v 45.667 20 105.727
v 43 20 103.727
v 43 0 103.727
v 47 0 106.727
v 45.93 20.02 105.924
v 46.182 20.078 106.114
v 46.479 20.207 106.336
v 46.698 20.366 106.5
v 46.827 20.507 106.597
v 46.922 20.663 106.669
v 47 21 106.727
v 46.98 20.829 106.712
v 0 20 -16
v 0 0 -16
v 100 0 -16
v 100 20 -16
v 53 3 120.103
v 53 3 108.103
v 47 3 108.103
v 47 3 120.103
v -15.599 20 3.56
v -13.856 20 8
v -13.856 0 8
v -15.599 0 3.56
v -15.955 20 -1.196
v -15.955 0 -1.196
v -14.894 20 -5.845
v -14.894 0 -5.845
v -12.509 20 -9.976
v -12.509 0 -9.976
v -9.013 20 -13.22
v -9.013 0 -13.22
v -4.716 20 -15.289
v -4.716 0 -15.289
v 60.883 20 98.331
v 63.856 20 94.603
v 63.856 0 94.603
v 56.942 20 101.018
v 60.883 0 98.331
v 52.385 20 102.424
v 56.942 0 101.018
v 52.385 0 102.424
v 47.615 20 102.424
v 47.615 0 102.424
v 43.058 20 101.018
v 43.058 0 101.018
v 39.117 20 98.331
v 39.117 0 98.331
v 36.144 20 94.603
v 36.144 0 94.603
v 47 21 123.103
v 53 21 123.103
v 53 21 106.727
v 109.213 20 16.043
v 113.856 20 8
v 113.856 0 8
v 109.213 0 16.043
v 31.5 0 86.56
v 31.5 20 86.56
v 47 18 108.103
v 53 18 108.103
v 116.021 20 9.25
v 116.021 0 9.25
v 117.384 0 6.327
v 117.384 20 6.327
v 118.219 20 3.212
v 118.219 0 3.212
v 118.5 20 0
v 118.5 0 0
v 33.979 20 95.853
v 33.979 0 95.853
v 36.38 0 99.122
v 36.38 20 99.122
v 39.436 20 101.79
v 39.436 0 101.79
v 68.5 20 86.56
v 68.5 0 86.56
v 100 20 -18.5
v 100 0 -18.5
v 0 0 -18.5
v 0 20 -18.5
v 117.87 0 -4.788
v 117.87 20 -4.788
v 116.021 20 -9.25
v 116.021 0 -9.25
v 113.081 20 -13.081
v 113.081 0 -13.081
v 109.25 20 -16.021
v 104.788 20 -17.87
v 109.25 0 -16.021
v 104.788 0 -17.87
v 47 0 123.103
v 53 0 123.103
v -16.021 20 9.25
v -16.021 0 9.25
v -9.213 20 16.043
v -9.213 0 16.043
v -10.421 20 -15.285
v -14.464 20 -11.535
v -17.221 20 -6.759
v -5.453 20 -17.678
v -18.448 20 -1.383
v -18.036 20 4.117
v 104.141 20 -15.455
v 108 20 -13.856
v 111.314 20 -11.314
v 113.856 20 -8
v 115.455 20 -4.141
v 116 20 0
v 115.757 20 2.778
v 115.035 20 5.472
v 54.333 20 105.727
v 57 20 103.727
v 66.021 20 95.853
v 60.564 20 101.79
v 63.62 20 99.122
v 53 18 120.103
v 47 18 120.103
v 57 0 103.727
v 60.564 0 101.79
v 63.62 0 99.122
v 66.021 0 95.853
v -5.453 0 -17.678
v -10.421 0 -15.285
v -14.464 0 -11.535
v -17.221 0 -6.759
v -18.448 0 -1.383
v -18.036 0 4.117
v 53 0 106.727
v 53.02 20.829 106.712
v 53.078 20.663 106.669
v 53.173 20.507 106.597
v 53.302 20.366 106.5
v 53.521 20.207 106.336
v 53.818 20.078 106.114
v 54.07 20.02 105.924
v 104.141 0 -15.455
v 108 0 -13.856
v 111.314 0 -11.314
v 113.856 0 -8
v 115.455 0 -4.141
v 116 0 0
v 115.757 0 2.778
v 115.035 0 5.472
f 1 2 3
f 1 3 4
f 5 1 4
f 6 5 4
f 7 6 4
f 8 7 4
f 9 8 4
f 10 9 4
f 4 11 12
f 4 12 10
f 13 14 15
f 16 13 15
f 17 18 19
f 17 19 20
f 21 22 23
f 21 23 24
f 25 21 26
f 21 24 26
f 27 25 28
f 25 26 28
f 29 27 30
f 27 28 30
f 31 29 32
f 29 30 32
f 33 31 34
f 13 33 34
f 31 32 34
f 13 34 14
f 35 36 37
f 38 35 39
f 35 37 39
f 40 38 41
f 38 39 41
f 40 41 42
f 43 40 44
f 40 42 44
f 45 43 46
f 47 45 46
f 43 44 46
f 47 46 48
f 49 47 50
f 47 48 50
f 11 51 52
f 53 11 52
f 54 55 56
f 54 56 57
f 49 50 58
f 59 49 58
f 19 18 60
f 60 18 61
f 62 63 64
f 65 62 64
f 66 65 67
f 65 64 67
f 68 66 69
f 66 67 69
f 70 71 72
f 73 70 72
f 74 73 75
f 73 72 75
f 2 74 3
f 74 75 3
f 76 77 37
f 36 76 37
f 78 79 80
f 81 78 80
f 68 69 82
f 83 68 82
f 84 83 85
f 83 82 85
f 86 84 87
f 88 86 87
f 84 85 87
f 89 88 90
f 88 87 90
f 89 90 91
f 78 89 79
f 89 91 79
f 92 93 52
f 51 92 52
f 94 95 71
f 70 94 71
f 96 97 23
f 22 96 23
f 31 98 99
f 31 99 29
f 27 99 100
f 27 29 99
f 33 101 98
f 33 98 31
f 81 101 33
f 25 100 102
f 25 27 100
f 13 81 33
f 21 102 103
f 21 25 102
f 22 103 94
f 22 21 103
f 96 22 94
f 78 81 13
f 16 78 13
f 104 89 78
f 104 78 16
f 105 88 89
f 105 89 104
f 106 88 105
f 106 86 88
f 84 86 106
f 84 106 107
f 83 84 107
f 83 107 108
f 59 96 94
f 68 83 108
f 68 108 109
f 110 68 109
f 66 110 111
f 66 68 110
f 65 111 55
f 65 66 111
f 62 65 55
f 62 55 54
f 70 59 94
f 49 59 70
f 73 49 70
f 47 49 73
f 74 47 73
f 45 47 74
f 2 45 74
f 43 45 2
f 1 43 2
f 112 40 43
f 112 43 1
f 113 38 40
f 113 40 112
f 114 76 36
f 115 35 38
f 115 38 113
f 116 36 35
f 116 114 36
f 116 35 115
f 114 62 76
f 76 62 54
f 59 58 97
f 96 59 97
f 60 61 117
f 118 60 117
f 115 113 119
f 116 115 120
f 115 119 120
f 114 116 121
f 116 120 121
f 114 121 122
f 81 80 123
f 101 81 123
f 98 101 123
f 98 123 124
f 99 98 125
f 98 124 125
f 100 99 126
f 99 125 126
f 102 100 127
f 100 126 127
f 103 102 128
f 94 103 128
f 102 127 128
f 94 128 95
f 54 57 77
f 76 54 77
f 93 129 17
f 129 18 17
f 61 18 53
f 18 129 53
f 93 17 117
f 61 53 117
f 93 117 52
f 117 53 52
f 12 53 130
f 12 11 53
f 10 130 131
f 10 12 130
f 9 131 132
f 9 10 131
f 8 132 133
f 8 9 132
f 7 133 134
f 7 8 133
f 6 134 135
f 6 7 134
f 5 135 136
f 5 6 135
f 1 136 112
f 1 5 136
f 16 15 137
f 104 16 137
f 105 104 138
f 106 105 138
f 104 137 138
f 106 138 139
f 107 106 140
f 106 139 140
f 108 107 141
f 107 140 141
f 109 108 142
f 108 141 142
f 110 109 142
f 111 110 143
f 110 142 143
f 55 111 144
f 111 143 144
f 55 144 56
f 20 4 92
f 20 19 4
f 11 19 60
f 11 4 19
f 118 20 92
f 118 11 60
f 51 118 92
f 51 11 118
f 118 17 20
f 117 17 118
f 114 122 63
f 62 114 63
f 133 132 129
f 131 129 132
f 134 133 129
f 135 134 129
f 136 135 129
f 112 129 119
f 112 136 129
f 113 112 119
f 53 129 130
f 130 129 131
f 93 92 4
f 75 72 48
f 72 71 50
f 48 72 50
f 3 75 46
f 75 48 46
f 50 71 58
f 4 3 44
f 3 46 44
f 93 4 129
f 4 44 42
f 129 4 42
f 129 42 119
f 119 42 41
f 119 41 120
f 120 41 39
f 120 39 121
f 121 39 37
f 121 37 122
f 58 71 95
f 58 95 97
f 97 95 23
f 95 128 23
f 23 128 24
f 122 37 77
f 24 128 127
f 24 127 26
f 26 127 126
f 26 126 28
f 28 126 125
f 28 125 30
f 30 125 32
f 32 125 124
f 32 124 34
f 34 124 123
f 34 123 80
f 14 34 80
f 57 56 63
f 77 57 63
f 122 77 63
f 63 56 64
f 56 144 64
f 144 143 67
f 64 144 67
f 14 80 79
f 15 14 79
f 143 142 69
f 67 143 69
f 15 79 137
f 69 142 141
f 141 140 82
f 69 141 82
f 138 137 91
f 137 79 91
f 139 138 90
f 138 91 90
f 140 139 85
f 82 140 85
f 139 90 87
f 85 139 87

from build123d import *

# Parameters (mm, degrees)
BOSS_EXTRUDE1_DEPTH      = 20
BOSS_EXTRUDE2_DEPTH      = 3
BOSS_EXTRUDE2_DEPTH_BACK = 3
SKETCH2_W                = 18
SKETCH2_H                = 21
SKETCH2_W_2              = 12
SKETCH2_H_2              = 15
BOSS_EXTRUDE3_DEPTH      = 21
CUT_EXTRUDE1_DEPTH       = 30
CUT_EXTRUDE1_DEPTH_BACK  = 30
SKETCH4_W                = 3
SKETCH4_H                = 1
FILLET1_R                = 1


with BuildPart() as part:
    # Sketch1 → Boss-Extrude1 (new body)
    with BuildSketch(Plane(origin=(0, 0, 0), x_dir=(1, 0, 0), z_dir=(0, 1, 0))):
        with BuildLine():
            Line((31.500049634, -86.559686407), (-9.212862555, -16.042853971))
            ThreePointArc((-9.212862555, -16.042853971), (-13.066315501, -13.096617855), (-16.02146997, -9.25))
            Line((-16.02146997, -9.25), (33.97853003, -95.852540378))
            ThreePointArc((33.97853003, -95.852540378), (32.124838484, -91.369992609), (31.500049634, -86.559686407))
        make_face()
        with BuildLine():
            Line((36.143593539, -94.602540378), (31.500049634, -86.559686407))
            ThreePointArc((31.500049634, -86.559686407), (32.124838484, -91.369992609), (33.97853003, -95.852540378))
            ThreePointArc((33.97853003, -95.852540378), (50, -105.102540378), (66.02146997, -95.852540378))
            ThreePointArc((66.02146997, -95.852540378), (67.869627786, -91.390692713), (68.5, -86.602540378))
            ThreePointArc((68.5, -86.602540378), (68.499987591, -86.581113379), (68.499950366, -86.559686407))
            Line((68.499950366, -86.559686407), (63.856406461, -94.602540378))
            ThreePointArc((63.856406461, -94.602540378), (50, -102.602540378), (36.143593539, -94.602540378))
        make_face()
        with BuildLine():
            ThreePointArc((116.02146997, -9.25), (113.066315501, -13.096617855), (109.212862555, -16.042853971))
            Line((109.212862555, -16.042853971), (68.499950366, -86.559686407))
            ThreePointArc((68.499950366, -86.559686407), (68.499987591, -86.581113379), (68.5, -86.602540378))
            ThreePointArc((68.5, -86.602540378), (67.869627786, -91.390692713), (66.02146997, -95.852540378))
            Line((66.02146997, -95.852540378), (116.02146997, -9.25))
        make_face()
        with BuildLine():
            ThreePointArc((100, 18.5), (95.191153985, 17.864070085), (90.712912189, 16))
            Line((90.712912189, 16), (100, 16))
            ThreePointArc((100, 16), (111.313708499, 11.313708499), (116, 0))
            ThreePointArc((116, 0), (115.454813221, -4.141104722), (113.856406461, -8))
            Line((113.856406461, -8), (109.212862555, -16.042853971))
            ThreePointArc((109.212862555, -16.042853971), (113.066315501, -13.096617855), (116.02146997, -9.25))
            ThreePointArc((116.02146997, -9.25), (117.869627786, -4.788152334), (118.5, 0))
            ThreePointArc((118.5, 0), (113.081475452, 13.081475452), (100, 18.5))
        make_face()
        with BuildLine():
            ThreePointArc((0, 18.5), (4.808846015, 17.864070085), (9.287087811, 16))
            Line((9.287087811, 16), (90.712912189, 16))
            ThreePointArc((90.712912189, 16), (95.191153985, 17.864070085), (100, 18.5))
            Line((100, 18.5), (0, 18.5))
        make_face()
        with BuildLine():
            ThreePointArc((-13.856406461, -8), (-13.856406461, 8), (0, 16))
            Line((0, 16), (9.287087811, 16))
            ThreePointArc((9.287087811, 16), (4.808846015, 17.864070085), (0, 18.5))
            ThreePointArc((0, 18.5), (-16.02146997, 9.25), (-16.02146997, -9.25))
            ThreePointArc((-16.02146997, -9.25), (-13.066315501, -13.096617855), (-9.212862555, -16.042853971))
            Line((-9.212862555, -16.042853971), (-13.856406461, -8))
        make_face()
    extrude(amount=BOSS_EXTRUDE1_DEPTH)



with BuildPart() as body_2:
    # Sketch2 → Boss-Extrude2 (new, two sides: drawn at the far end of the back side and taken through both)
    with BuildSketch(Plane.ZY.offset(-50).offset(-BOSS_EXTRUDE2_DEPTH_BACK)):
        with Locations((114.102540378, 10.5)):
            Rectangle(SKETCH2_W, SKETCH2_H)
        with Locations((114.102540378, 10.5)):
            Rectangle(SKETCH2_W_2, SKETCH2_H_2, mode=Mode.SUBTRACT)
    extrude(amount=BOSS_EXTRUDE2_DEPTH + BOSS_EXTRUDE2_DEPTH_BACK)


with BuildPart() as part_1:
    add(part.part)

    add(body_2.part)  # Boss-Extrude3 merges body 2
    # Sketch3 → Boss-Extrude3 (add)
    with BuildSketch(Plane(origin=(0, 21, 0), x_dir=(1, 0, 0), z_dir=(0, 1, 0))):
        Polygon((43, -103.727084168), (47, -106.727084168), (47, -105.102540378), (53, -105.102540378), (53, -106.727084168), (57, -103.727084168), align=None)
    extrude(amount=-BOSS_EXTRUDE3_DEPTH)

    # Sketch4 → Cut-Extrude1 (cut, two sides: drawn at the far end of the back side and taken through both)
    with BuildSketch(Plane.ZY.offset(-50).offset(-CUT_EXTRUDE1_DEPTH_BACK)):
        with Locations((105.227084168, 20.5)):
            Rectangle(SKETCH4_W, SKETCH4_H)
    extrude(amount=CUT_EXTRUDE1_DEPTH + CUT_EXTRUDE1_DEPTH_BACK, mode=Mode.SUBTRACT)

    # Fillet1
    fillet1_edges = [part_1.edges().sort_by_distance(p)[0] for p in [
        (50, 20, 106.727084168),
    ]]
    fillet(fillet1_edges, radius=FILLET1_R - 0.0001)  # a hair under: the kernel refuses the full size


solid = part_1.part
